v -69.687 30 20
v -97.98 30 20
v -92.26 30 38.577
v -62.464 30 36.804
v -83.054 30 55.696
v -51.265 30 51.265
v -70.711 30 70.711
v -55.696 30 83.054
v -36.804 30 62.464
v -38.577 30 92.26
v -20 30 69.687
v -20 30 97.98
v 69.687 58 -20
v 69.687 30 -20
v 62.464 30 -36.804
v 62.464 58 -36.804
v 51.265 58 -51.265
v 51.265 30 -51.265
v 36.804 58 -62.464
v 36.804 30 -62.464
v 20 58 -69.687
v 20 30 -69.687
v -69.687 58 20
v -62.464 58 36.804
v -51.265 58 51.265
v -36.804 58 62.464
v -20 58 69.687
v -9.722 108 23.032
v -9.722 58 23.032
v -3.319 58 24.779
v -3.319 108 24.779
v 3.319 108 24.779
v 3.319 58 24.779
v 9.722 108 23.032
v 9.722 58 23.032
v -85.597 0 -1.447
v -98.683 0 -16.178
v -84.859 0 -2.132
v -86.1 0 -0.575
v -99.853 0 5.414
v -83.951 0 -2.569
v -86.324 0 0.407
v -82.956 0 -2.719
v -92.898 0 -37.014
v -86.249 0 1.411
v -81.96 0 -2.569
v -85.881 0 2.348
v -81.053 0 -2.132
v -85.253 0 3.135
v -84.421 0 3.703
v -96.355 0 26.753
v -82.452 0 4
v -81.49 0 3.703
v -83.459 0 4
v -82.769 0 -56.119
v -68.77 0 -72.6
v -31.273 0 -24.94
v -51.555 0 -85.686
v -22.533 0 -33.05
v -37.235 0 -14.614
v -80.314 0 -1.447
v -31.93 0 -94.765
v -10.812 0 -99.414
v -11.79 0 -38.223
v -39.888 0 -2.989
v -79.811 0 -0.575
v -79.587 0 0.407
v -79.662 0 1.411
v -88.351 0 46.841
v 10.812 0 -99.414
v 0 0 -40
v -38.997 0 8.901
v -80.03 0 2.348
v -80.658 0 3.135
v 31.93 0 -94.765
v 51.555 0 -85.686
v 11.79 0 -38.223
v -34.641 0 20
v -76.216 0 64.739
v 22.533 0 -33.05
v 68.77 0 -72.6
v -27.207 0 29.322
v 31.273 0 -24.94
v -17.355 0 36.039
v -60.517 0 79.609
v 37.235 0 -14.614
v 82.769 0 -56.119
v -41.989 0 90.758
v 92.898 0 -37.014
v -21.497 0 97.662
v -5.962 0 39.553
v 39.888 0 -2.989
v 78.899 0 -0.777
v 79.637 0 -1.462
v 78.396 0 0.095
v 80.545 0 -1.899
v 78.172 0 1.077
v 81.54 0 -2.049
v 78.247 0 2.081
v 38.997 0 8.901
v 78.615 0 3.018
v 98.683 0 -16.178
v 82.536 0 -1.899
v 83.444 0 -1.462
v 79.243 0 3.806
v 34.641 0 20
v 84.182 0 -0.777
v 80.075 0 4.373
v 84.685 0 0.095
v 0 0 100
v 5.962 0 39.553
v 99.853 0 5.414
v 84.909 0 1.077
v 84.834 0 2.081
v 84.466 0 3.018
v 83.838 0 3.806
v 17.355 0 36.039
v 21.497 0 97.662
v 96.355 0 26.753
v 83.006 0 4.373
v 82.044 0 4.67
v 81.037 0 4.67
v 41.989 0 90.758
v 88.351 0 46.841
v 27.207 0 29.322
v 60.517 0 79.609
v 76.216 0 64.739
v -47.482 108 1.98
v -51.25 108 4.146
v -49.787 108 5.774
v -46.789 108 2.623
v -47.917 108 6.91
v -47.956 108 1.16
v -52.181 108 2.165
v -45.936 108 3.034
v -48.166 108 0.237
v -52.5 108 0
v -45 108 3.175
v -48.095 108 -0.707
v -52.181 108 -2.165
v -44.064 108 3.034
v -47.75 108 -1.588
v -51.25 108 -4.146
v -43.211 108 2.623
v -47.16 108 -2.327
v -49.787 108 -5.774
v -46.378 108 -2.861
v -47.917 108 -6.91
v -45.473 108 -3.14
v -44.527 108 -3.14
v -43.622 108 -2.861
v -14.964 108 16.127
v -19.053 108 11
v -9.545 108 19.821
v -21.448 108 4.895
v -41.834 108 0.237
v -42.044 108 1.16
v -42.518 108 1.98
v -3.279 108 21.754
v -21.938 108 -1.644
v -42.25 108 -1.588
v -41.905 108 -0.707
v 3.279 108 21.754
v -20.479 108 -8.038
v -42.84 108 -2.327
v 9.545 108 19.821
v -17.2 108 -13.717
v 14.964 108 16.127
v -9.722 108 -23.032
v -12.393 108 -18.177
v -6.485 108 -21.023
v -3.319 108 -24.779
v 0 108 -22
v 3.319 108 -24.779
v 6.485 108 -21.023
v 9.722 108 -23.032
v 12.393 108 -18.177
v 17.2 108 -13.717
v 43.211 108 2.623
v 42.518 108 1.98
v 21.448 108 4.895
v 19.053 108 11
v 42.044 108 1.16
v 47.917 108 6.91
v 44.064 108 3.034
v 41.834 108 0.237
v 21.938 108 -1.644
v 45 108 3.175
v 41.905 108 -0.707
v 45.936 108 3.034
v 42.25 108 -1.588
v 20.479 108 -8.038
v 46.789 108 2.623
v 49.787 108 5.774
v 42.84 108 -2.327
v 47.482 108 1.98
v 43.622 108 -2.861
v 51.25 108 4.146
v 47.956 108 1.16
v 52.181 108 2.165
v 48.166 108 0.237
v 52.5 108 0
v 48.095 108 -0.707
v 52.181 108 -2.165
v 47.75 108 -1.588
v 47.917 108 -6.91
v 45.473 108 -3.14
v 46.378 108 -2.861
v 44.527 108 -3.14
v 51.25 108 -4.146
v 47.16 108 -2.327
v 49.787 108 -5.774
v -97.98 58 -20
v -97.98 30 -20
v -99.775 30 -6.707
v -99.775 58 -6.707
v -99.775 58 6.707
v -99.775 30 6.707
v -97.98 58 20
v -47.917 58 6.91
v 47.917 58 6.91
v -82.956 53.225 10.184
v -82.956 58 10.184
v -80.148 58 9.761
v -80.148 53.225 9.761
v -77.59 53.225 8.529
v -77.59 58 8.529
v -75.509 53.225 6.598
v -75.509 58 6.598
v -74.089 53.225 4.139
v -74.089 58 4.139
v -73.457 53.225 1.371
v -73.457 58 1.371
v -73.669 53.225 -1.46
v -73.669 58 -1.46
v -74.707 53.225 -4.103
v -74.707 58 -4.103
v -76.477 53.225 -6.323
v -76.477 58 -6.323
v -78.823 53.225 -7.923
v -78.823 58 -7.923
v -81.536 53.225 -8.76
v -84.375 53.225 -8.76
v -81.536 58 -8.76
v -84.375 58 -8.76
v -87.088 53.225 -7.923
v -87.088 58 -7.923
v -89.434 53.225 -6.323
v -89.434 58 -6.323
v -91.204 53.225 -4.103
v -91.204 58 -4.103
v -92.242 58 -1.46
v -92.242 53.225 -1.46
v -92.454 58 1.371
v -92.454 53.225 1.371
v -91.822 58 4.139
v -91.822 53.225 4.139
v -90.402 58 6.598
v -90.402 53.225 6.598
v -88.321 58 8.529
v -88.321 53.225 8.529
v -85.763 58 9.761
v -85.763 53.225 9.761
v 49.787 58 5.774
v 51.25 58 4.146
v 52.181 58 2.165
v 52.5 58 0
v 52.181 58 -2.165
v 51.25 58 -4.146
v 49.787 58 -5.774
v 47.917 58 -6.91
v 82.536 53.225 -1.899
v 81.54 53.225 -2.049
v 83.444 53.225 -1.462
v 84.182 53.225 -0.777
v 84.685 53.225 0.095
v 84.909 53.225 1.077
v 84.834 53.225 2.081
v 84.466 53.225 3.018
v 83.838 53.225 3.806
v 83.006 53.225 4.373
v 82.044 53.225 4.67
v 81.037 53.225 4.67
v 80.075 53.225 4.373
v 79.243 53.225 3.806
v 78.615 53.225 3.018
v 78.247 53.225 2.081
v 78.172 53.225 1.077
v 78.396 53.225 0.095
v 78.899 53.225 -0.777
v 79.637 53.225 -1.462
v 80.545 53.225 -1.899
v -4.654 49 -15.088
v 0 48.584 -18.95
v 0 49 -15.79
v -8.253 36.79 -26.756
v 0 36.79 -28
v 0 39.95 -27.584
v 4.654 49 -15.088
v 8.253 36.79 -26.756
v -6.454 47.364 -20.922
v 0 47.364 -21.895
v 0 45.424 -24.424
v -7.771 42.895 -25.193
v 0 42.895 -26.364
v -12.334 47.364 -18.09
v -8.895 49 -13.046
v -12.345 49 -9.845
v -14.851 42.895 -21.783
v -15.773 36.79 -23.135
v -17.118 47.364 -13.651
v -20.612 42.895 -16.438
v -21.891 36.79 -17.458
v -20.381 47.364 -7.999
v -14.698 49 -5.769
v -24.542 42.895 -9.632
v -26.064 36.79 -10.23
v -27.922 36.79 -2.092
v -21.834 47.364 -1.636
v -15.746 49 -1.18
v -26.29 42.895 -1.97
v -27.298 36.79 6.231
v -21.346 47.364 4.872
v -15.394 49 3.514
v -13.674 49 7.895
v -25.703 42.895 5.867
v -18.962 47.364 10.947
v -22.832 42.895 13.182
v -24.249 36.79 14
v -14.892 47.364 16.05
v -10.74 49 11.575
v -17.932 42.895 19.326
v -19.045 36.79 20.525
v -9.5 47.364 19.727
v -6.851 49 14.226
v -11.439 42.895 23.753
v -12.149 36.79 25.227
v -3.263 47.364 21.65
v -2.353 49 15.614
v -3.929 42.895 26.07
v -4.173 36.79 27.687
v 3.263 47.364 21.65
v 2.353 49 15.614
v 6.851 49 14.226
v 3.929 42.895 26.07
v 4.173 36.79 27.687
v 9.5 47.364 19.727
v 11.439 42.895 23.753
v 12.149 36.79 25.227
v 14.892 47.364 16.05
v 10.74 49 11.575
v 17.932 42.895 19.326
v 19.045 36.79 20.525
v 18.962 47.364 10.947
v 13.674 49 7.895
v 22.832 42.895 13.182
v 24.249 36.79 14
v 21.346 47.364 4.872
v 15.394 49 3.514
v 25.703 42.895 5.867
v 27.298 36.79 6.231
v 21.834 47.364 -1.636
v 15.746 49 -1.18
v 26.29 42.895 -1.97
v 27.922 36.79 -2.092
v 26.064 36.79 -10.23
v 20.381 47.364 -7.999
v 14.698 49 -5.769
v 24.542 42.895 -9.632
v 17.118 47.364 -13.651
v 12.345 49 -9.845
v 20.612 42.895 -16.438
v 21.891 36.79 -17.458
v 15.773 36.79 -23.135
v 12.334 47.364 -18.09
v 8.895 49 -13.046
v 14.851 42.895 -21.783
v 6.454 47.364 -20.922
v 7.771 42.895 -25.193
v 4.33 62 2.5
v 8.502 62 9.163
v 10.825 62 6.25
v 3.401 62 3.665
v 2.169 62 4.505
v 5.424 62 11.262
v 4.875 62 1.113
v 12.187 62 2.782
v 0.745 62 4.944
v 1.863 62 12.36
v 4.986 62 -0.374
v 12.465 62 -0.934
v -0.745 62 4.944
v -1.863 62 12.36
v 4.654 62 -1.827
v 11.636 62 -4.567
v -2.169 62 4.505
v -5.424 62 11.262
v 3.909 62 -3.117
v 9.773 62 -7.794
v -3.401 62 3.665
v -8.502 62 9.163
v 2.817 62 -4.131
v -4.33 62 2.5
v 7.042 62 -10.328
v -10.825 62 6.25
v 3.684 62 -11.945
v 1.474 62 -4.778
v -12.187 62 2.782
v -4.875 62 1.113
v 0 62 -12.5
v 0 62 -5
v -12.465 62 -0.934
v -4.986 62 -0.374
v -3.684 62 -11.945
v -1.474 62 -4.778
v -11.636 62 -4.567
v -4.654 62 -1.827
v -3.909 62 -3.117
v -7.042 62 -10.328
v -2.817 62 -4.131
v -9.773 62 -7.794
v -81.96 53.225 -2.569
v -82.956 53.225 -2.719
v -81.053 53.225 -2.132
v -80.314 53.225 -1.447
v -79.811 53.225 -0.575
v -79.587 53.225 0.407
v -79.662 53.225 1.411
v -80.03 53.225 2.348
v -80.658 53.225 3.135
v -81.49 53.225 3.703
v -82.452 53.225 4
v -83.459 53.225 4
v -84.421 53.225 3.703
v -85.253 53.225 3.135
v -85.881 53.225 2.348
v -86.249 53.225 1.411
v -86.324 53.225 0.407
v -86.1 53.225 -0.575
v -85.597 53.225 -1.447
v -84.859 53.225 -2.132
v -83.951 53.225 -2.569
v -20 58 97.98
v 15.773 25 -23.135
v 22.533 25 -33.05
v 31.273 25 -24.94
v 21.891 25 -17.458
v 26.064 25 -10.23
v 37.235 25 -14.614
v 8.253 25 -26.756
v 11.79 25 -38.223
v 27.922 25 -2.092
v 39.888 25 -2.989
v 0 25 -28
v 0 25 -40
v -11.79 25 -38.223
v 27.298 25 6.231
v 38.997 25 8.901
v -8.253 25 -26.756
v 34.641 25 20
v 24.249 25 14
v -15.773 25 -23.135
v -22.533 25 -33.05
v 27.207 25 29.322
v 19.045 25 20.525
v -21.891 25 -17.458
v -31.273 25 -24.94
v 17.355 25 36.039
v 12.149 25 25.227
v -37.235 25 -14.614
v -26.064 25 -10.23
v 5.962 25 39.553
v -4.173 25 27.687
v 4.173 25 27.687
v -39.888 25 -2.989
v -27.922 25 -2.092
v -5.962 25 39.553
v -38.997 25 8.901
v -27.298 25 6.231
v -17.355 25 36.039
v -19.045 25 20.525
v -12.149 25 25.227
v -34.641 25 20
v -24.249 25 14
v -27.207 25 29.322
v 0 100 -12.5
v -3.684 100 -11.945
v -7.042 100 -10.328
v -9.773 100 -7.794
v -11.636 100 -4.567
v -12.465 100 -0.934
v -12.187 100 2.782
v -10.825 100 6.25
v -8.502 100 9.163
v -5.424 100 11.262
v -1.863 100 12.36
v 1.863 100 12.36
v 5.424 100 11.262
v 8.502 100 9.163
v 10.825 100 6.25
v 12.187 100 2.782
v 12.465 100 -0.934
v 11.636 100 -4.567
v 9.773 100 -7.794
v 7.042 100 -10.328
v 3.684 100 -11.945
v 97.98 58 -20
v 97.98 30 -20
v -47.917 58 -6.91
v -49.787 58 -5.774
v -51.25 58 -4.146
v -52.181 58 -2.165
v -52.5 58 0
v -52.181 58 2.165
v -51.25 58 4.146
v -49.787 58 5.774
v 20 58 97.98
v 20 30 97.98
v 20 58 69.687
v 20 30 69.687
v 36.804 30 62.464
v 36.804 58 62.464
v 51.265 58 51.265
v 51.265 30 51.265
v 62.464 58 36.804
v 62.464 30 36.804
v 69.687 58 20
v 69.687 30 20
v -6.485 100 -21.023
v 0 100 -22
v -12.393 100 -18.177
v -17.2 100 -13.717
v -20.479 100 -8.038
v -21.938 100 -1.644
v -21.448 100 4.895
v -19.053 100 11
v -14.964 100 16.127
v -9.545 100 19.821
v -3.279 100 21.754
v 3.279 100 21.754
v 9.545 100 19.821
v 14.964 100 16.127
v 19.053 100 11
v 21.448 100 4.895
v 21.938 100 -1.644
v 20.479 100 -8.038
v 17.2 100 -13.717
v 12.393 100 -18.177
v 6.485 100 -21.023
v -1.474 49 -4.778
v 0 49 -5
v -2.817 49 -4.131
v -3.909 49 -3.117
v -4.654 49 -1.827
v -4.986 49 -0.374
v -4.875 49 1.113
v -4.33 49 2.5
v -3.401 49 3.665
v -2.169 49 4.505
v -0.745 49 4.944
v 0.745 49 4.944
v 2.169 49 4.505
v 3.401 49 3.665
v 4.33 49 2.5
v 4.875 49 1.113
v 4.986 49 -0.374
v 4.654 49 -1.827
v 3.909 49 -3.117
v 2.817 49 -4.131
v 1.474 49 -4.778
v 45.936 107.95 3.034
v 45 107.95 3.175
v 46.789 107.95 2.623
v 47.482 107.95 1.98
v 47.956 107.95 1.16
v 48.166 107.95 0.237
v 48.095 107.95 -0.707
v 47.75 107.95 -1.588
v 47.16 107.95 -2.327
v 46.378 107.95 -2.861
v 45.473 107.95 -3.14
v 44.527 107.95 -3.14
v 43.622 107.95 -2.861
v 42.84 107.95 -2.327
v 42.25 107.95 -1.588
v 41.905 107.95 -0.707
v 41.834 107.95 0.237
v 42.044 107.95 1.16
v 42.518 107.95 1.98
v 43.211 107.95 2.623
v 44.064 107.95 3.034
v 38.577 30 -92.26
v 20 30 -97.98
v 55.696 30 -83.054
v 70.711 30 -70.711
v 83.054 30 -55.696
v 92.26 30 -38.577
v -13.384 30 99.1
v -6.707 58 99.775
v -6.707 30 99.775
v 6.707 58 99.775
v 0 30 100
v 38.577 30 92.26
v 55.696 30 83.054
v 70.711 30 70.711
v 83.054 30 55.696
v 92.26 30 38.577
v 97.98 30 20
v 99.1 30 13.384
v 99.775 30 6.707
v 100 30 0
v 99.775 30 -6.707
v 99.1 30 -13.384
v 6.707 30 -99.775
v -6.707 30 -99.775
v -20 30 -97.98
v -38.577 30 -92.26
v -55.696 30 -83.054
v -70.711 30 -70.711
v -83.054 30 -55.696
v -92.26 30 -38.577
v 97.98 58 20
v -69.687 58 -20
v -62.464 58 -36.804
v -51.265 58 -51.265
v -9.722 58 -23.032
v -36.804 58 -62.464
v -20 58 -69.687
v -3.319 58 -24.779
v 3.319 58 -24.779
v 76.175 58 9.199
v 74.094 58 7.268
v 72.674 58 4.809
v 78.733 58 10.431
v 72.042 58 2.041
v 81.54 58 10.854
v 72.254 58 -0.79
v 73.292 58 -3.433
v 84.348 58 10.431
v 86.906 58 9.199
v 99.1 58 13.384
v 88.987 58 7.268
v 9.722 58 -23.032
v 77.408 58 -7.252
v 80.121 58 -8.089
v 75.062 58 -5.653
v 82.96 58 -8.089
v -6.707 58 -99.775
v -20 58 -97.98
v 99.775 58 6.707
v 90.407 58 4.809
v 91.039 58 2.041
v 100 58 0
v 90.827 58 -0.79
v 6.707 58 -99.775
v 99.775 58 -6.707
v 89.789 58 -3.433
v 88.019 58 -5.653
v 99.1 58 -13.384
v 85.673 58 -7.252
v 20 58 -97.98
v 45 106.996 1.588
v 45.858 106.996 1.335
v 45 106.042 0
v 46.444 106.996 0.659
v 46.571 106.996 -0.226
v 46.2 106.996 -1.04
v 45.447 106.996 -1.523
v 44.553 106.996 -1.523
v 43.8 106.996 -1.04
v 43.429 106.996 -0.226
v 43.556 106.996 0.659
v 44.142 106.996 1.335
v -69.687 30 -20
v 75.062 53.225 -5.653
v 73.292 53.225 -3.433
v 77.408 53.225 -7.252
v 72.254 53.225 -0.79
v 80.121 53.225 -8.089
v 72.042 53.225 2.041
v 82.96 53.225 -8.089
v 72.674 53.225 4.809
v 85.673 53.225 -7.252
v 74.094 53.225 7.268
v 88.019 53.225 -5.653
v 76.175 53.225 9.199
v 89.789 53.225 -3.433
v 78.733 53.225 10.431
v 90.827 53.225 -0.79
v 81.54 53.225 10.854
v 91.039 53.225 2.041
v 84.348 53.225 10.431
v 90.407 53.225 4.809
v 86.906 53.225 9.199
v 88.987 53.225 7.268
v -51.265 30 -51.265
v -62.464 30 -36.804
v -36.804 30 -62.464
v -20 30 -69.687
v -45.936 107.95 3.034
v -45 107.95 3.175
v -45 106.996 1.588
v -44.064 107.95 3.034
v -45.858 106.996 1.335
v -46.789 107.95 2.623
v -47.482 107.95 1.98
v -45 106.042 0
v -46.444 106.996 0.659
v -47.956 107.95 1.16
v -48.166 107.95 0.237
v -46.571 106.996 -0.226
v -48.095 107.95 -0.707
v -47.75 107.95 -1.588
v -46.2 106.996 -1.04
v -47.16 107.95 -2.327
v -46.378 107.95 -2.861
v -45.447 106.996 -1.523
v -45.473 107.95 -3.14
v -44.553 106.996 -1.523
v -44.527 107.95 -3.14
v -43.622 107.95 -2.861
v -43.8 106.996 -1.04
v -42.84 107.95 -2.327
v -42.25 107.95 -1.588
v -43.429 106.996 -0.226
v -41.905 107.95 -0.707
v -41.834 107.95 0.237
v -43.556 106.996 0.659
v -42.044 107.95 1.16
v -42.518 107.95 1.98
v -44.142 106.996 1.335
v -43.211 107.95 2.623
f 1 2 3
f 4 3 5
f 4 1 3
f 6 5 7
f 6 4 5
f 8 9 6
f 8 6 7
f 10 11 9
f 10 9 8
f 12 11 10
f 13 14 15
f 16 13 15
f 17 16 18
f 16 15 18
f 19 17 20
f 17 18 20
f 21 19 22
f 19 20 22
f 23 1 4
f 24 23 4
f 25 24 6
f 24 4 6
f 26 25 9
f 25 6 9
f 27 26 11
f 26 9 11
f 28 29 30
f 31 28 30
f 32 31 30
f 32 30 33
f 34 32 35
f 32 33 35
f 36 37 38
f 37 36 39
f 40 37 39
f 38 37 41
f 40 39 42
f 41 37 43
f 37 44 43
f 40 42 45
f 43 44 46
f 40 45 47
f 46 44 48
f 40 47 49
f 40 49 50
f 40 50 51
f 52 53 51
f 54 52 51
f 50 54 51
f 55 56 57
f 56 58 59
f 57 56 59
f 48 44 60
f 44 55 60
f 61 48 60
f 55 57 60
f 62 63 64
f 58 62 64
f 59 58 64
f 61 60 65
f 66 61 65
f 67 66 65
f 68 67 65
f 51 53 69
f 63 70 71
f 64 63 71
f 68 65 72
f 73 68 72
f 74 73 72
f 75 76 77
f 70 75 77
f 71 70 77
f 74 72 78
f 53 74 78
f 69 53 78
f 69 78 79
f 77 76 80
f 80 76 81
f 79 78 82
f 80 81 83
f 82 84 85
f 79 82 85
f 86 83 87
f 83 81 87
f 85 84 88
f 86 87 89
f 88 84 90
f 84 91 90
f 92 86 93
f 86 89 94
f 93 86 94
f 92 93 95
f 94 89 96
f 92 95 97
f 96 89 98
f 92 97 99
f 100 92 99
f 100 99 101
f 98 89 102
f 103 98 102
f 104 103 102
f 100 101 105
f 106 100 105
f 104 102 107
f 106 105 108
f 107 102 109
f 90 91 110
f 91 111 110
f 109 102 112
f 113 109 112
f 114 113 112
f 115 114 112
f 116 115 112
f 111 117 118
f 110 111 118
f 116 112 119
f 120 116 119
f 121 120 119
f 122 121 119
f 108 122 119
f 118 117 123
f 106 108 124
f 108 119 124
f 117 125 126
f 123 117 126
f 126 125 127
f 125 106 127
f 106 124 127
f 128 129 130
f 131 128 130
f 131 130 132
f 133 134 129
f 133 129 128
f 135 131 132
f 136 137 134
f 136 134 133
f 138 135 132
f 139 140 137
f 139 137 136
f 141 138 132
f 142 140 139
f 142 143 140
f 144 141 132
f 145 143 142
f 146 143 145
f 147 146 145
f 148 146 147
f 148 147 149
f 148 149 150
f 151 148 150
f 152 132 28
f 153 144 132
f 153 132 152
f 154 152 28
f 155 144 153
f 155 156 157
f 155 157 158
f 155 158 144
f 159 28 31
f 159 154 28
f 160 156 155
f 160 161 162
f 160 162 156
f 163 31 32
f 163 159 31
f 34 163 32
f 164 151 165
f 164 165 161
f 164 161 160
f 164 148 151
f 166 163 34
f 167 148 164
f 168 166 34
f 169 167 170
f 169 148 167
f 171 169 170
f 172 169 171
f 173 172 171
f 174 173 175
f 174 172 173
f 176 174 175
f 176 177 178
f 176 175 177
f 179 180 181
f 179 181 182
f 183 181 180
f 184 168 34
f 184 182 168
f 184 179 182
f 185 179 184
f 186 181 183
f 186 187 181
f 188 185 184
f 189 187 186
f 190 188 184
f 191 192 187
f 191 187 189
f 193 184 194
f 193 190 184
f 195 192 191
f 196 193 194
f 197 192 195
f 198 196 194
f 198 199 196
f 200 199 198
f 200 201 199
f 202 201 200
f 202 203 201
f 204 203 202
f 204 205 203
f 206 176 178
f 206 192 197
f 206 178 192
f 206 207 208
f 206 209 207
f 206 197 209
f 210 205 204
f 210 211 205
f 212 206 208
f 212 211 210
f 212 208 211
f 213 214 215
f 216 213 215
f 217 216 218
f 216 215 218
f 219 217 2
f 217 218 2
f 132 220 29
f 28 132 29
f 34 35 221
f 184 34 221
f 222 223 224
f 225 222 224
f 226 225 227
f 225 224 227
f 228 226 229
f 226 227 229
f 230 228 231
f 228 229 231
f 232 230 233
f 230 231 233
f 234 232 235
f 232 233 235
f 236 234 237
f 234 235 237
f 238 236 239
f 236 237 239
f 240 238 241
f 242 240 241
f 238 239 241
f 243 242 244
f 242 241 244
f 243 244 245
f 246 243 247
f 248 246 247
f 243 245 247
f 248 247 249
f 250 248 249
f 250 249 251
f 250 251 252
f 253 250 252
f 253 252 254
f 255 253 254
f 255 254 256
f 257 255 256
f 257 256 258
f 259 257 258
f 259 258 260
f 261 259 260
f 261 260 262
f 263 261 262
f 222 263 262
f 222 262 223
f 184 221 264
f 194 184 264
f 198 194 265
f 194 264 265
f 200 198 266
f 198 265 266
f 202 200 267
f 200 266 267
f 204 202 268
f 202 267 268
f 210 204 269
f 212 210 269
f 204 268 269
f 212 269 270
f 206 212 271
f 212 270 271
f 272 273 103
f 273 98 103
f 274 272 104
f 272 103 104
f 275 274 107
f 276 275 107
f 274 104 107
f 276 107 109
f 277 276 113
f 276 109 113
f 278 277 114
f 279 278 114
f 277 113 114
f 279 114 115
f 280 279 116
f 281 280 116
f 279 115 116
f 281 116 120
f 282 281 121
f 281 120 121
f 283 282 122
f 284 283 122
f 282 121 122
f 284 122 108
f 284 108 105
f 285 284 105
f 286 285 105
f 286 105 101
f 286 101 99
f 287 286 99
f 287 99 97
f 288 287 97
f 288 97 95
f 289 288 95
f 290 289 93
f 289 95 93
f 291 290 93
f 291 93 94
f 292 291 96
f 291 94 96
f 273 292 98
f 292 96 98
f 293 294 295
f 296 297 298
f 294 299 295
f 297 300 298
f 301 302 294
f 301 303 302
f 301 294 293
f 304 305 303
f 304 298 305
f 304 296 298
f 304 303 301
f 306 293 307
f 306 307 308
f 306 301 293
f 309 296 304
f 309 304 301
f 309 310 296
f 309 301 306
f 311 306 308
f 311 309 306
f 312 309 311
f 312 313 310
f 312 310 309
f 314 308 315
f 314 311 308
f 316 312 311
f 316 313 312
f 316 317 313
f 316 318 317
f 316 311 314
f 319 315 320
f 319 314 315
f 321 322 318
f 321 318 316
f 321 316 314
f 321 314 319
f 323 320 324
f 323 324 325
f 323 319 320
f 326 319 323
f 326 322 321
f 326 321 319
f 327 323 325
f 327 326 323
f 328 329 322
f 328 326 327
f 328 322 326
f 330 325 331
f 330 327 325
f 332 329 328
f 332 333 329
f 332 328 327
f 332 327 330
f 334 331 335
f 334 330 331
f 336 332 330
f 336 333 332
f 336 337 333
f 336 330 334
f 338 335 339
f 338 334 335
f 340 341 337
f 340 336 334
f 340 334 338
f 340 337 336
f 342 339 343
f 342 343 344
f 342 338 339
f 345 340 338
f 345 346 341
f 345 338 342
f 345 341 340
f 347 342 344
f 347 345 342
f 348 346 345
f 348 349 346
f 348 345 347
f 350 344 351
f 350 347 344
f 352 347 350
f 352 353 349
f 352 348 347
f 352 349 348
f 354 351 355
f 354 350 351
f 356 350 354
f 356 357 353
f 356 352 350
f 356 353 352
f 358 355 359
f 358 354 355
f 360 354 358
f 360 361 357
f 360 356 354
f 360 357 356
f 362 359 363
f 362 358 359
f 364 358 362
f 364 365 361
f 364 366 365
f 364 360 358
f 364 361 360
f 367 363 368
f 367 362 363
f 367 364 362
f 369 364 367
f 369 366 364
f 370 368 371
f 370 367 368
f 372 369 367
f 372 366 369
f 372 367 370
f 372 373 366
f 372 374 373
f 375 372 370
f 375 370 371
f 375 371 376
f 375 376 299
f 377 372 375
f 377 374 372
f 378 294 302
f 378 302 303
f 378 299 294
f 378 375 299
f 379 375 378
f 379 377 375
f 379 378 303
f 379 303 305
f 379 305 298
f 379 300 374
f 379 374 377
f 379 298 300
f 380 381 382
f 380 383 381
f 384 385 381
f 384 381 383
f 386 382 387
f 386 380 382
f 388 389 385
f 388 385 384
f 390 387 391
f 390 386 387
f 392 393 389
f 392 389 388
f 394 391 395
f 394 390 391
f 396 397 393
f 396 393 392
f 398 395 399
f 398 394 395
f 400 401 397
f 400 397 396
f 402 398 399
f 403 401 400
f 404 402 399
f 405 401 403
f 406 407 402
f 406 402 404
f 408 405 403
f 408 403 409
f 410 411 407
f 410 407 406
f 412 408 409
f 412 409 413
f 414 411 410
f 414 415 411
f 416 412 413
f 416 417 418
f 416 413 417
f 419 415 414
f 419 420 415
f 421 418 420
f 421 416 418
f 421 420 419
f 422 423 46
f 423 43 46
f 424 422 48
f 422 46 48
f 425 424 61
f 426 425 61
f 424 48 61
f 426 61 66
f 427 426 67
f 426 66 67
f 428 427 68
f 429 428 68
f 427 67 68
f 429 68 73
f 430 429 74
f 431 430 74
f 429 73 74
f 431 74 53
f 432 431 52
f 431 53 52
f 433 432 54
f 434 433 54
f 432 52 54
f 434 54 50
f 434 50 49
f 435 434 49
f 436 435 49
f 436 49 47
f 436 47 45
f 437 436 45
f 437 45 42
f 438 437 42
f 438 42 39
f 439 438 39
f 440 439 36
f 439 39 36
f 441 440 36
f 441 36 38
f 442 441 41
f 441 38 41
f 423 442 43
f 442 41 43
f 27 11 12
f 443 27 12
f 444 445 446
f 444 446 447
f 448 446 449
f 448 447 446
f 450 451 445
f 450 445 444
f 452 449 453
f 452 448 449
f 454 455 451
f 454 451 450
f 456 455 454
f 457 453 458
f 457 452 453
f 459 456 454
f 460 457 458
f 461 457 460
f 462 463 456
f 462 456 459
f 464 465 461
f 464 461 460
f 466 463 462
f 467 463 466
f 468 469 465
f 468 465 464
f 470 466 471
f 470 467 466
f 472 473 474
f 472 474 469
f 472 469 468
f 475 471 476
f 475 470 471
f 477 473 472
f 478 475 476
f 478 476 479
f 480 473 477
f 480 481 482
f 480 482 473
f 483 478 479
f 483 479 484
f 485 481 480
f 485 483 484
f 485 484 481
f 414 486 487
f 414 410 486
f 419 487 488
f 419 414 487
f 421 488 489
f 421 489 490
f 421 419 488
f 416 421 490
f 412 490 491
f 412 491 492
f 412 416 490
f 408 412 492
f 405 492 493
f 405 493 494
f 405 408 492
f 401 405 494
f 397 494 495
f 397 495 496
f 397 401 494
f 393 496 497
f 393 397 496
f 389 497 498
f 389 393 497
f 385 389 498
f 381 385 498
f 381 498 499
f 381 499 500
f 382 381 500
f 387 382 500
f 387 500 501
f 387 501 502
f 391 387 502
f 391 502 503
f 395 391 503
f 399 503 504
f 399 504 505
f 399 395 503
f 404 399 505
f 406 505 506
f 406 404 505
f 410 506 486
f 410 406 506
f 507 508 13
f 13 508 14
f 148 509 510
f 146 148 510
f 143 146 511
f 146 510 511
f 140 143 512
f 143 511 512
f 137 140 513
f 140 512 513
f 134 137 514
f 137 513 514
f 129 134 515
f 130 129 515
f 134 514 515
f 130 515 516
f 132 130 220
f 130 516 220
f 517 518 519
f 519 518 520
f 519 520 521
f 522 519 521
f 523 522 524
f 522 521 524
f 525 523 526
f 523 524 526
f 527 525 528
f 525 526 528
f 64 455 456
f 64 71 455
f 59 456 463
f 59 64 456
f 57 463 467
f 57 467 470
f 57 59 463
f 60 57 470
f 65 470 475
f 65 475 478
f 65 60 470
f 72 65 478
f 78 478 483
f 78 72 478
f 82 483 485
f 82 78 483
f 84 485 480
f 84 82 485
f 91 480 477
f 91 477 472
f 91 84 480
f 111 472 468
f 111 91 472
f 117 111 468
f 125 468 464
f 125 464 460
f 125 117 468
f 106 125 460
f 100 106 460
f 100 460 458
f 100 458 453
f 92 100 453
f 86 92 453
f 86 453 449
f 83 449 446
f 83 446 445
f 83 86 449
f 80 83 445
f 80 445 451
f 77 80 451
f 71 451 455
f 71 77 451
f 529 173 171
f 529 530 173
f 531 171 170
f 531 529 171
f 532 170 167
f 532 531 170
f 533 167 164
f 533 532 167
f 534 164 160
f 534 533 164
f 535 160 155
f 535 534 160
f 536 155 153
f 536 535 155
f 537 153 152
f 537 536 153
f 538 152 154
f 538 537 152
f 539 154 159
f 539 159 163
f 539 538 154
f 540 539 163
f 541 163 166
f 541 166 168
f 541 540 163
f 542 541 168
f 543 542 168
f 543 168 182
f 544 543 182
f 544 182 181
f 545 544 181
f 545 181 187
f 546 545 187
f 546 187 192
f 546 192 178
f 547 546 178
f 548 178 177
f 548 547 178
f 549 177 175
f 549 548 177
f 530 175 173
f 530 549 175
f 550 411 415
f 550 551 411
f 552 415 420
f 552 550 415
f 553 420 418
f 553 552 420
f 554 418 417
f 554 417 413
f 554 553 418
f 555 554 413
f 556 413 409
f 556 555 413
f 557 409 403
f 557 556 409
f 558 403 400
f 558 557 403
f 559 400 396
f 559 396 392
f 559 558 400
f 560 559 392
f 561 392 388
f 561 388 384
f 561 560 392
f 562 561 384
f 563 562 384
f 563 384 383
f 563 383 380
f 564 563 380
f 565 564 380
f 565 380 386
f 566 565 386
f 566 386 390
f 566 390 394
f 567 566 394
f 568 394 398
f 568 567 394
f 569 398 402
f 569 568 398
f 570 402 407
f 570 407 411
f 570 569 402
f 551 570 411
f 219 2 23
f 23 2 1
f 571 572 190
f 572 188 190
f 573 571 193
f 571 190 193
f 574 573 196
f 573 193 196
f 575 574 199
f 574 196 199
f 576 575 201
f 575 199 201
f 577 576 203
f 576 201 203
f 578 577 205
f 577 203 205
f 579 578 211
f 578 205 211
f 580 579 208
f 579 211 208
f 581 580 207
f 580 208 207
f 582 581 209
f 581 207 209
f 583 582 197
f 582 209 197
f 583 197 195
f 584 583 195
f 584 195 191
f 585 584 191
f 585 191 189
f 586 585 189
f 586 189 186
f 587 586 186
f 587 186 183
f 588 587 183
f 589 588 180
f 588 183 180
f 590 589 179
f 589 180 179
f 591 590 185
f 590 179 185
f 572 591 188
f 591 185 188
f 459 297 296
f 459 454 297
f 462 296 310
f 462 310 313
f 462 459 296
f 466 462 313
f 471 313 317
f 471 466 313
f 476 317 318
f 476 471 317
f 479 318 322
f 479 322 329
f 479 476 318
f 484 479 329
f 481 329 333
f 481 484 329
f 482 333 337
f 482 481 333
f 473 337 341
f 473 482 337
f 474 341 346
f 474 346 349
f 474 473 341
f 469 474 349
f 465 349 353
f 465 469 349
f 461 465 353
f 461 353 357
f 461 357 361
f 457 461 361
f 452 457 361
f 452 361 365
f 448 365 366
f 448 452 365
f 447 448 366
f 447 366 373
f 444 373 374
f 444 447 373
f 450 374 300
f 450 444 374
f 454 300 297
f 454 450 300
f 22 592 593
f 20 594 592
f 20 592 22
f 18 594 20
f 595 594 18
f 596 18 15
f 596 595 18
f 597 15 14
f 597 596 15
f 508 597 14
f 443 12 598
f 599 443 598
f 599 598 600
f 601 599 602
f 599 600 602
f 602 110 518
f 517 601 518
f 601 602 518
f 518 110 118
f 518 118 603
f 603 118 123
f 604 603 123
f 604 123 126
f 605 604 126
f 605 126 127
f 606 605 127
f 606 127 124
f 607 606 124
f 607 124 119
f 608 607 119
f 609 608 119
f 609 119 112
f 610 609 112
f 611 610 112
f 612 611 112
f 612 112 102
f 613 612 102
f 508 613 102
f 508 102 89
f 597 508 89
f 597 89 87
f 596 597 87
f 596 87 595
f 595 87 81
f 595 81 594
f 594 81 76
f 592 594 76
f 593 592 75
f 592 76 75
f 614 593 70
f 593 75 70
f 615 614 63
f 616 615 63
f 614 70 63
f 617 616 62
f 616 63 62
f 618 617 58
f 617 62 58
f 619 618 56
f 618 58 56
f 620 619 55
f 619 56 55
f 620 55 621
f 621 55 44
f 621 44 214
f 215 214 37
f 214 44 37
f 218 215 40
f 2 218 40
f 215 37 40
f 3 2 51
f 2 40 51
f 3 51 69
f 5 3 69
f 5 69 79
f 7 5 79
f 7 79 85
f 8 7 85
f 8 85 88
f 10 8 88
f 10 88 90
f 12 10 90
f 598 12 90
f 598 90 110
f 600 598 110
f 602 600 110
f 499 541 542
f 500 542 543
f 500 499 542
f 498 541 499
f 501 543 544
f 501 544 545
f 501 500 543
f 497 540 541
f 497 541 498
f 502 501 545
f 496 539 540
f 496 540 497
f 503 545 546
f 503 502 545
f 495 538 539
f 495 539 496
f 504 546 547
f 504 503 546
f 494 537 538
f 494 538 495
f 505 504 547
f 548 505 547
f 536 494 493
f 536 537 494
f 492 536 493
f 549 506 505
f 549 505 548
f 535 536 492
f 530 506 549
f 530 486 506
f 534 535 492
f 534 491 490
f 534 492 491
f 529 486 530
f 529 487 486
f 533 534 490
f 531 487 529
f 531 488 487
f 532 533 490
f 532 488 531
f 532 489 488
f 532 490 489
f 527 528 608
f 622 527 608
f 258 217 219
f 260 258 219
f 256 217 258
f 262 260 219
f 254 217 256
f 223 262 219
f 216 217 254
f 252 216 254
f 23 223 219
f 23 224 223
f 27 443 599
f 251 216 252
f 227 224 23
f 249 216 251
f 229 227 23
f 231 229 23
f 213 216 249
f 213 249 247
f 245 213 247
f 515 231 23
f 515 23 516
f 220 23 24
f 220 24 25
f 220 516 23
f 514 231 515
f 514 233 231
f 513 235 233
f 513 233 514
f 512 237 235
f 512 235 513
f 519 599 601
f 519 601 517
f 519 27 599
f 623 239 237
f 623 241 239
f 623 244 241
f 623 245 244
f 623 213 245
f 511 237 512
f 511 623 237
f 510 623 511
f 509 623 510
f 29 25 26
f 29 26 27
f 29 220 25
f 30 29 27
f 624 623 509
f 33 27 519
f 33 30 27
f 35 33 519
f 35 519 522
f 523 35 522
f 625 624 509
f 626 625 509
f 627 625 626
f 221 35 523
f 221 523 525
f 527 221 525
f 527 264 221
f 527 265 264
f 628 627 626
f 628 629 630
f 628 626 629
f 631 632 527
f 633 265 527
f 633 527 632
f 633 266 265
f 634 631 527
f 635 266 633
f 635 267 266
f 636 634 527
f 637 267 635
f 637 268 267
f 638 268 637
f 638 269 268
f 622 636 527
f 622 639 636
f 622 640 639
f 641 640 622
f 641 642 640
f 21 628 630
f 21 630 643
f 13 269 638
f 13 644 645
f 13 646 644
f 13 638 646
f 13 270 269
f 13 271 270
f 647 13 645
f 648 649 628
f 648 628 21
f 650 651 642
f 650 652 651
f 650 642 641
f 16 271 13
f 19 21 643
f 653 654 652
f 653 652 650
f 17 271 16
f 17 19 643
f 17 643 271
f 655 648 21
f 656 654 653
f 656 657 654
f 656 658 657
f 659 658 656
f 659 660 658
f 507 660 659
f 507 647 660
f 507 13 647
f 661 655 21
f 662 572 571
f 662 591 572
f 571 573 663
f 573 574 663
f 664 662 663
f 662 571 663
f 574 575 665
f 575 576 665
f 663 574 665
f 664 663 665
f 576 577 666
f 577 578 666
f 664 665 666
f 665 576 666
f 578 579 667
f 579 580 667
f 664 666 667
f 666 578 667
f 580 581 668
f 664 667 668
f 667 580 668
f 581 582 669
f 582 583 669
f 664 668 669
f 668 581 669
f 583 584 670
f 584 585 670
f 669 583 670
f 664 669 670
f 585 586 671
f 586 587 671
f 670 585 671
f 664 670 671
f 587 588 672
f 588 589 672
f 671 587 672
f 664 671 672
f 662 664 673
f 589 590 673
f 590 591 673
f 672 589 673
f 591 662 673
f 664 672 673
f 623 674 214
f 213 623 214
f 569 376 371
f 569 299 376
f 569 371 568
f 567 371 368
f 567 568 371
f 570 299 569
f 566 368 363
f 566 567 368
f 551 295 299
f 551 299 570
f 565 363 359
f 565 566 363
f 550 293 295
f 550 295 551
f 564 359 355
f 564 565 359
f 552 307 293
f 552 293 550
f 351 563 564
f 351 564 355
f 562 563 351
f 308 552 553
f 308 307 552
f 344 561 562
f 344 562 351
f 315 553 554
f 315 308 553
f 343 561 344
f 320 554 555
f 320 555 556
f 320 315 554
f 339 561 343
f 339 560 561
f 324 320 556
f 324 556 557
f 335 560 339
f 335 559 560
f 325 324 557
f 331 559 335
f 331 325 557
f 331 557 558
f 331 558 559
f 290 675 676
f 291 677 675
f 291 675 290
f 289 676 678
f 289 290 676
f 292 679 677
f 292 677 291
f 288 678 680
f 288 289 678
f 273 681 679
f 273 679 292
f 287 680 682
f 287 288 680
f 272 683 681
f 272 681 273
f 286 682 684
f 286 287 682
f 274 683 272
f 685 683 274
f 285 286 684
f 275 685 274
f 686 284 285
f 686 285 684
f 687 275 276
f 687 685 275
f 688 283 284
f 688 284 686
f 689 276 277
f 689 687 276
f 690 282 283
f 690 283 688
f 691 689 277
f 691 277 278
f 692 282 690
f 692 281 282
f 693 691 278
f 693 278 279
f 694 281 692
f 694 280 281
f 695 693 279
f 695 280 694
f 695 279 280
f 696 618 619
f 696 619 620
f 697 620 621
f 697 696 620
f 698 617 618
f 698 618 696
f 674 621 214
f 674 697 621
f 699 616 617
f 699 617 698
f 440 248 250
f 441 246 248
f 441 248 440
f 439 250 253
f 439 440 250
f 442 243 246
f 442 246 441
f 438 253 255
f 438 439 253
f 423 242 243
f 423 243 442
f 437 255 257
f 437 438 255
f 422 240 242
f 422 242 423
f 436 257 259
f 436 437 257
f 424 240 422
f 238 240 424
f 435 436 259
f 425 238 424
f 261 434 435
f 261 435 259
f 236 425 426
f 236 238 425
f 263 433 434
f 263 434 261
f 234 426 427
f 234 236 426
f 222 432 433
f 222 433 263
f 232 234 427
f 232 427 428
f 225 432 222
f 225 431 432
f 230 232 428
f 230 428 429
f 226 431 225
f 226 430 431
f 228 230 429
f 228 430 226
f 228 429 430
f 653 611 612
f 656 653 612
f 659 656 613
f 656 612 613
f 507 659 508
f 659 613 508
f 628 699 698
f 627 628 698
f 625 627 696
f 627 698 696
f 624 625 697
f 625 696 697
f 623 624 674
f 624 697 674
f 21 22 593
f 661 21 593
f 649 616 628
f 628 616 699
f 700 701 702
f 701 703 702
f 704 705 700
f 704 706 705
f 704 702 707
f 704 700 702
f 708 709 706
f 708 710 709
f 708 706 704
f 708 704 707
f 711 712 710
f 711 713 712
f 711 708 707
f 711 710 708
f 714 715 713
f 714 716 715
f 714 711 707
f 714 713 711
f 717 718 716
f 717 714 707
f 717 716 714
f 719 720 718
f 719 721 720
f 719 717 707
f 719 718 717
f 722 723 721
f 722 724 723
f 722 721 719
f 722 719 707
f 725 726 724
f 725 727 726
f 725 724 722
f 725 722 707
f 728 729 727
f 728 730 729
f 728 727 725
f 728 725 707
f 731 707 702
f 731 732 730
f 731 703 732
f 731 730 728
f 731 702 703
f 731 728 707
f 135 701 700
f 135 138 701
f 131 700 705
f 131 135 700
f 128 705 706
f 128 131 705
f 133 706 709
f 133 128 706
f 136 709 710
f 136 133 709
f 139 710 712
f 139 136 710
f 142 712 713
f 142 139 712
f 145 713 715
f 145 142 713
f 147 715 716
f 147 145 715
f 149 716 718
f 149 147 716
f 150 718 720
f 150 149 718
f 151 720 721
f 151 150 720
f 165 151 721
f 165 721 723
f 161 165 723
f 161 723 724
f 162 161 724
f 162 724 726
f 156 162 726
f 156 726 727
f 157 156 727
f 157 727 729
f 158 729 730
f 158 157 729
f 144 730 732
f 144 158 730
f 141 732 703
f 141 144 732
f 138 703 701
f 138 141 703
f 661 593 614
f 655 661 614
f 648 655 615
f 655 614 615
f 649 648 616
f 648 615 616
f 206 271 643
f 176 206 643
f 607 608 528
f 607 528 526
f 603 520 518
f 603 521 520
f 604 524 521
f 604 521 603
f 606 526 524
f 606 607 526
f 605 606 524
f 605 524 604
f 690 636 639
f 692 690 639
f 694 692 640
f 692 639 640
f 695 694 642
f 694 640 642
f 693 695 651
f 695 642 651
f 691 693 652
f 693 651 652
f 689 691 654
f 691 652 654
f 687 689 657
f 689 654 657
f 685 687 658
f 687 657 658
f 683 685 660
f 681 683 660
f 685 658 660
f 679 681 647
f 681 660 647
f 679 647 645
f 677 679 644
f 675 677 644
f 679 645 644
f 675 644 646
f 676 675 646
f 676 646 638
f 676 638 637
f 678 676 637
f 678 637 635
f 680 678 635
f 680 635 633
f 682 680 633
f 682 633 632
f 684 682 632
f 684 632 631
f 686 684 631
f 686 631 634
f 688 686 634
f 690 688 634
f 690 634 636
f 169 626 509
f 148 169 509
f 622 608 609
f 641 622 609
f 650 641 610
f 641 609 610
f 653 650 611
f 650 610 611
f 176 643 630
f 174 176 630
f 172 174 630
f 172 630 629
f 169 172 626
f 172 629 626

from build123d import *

# Parameters (mm, degrees)
SKETCH2_R                                = 100
BOSS_EXTRUDE1_DEPTH                      = 30
BOSS_EXTRUDE2_DEPTH                      = 28
BOSS_EXTRUDE3_DEPTH                      = 50
CBORE_FOR_1_4_HEX_HEAD_BOLT1_D           = 6.7564
CBORE_FOR_1_4_HEX_HEAD_BOLT1_CBORE_D     = 19.05
CBORE_FOR_1_4_HEX_HEAD_BOLT1_CBORE_DEPTH = 4.7752


with BuildPart() as part:
    # Sketch2 → Boss-Extrude1 (new body)
    with BuildSketch(Plane(origin=(0, 0, 0), x_dir=(1, 0, 0), z_dir=(0, 1, 0))):
        with Locations(Location((0, 0, 0), (0, 0, 270))):
            Circle(SKETCH2_R)
    extrude(amount=BOSS_EXTRUDE1_DEPTH)

    # Sketch3 → Boss-Extrude2 (add)
    with BuildSketch(Plane(origin=(0, 30, 0), x_dir=(1, 0, 0), z_dir=(0, 1, 0))):
        with BuildLine():
            ThreePointArc((20, 97.979589711), (0, 100), (-20, 97.979589711))
            Line((-20, 97.979589711), (-20, 69.686799324))
            ThreePointArc((-20, 69.686799324), (-51.265241636, 51.265241636), (-69.686799324, 20))
            Line((-69.686799324, 20), (-97.979589711, 20))
            ThreePointArc((-97.979589711, 20), (-100, 0), (-97.979589711, -20))
            Line((-97.979589711, -20), (-69.686799324, -20))
            ThreePointArc((-69.686799324, -20), (-51.265241636, -51.265241636), (-20, -69.686799324))
            Line((-20, -69.686799324), (-20, -97.979589711))
            ThreePointArc((-20, -97.979589711), (0, -100), (20, -97.979589711))
            Line((20, -97.979589711), (20, -69.686799324))
            ThreePointArc((20, -69.686799324), (51.265241636, -51.265241636), (69.686799324, -20))
            Line((69.686799324, -20), (97.979589711, -20))
            ThreePointArc((97.979589711, -20), (99.493615301, -10.050896201), (100, 0))
            ThreePointArc((100, 0), (99.493615301, 10.050896201), (97.979589711, 20))
            Line((97.979589711, 20), (69.686799324, 20))
            ThreePointArc((69.686799324, 20), (51.265241636, 51.265241636), (20, 69.686799324))
            Line((20, 69.686799324), (20, 97.979589711))
        make_face()
    extrude(amount=BOSS_EXTRUDE2_DEPTH)

    # Sketch4 → Boss-Extrude3 (add)
    with BuildSketch(Plane(origin=(0, 58, 0), x_dir=(1, 0, 0), z_dir=(0, 1, 0))):
        with BuildLine():
            Line((-9.722222222, 23.0321166), (-47.916666667, 6.90963498))
            ThreePointArc((-47.916666667, 6.90963498), (-52.5, 0), (-47.916666667, -6.90963498))
            Line((-47.916666667, -6.90963498), (-9.722222222, -23.0321166))
            ThreePointArc((-9.722222222, -23.0321166), (0, -25), (9.722222222, -23.0321166))
            Line((9.722222222, -23.0321166), (47.916666667, -6.90963498))
            ThreePointArc((47.916666667, -6.90963498), (52.5, 0), (47.916666667, 6.90963498))
            Line((47.916666667, 6.90963498), (9.722222222, 23.0321166))
            ThreePointArc((9.722222222, 23.0321166), (0, 25), (-9.722222222, 23.0321166))
        make_face()
    extrude(amount=BOSS_EXTRUDE3_DEPTH)

    # CBORE for 1/4 Hex Head Bolt1 (through all)
    with Locations(Plane(origin=(-82.955537588, 58, 0.659036268), x_dir=(0, 0, 1), z_dir=(0, 1, 0))):
        with Locations((0, 0), (0.670356689, 164.496030798)):
            CounterBoreHole(CBORE_FOR_1_4_HEX_HEAD_BOLT1_D / 2, CBORE_FOR_1_4_HEX_HEAD_BOLT1_CBORE_D / 2, CBORE_FOR_1_4_HEX_HEAD_BOLT1_CBORE_DEPTH)

    # Sketch8 → 1/4 (0.25) Diameter Hole1 (revolve, cut)
    with BuildSketch(Plane(origin=(-45, 108, 0), x_dir=(0, 0, 1), z_dir=(1, 0, 0))):
        Polygon((0, 0), (0, 1.957732465), (3.175, 0.05), (3.175, 0), align=None)
    f_1_4_0_25_diameter_hole1 = revolve(axis=Axis((-45, 114.35, 0), (0, -1, 0)), mode=Mode.SUBTRACT)

    # Mirror1: 1/4 (0.25) Diameter Hole1 across plane
    add(f_1_4_0_25_diameter_hole1.mirror(Plane(origin=(0, 0, 0), x_dir=(0, 0, 1), z_dir=(1, 0, 0))), mode=Mode.SUBTRACT)

    # Sketch9 → Cut-Revolve1 (revolve, cut)
    with BuildSketch(Plane.XY, mode=Mode.PRIVATE) as cut_revolve1_sk:
        with BuildLine():
            Line((0, 108), (-22, 108))
            Line((-22, 108), (-22, 100))
            Line((-22, 100), (-12.5, 100))
            Line((-12.5, 100), (-12.5, 62))
            Line((-12.5, 62), (-5, 62))
            Line((-5, 62), (-5, 49))
            Line((-5, 49), (-15.789877929, 49))
            ThreePointArc((-15.789877929, 49), (-24.423738044, 45.423738044), (-28, 36.789877929))
            Line((-28, 36.789877929), (-28, 25))
            Line((-28, 25), (-40, 25))
            Line((-40, 25), (-40, 0))
            Line((-40, 0), (0, 0))
            Line((0, 0), (0, 108))
        make_face()
    revolve(cut_revolve1_sk.sketch.rotate(Axis((0, 0, 0), (0, 1, 0)), 270), axis=Axis((0, 0, 0), (0, 1, 0)), mode=Mode.SUBTRACT)


solid = part.part
